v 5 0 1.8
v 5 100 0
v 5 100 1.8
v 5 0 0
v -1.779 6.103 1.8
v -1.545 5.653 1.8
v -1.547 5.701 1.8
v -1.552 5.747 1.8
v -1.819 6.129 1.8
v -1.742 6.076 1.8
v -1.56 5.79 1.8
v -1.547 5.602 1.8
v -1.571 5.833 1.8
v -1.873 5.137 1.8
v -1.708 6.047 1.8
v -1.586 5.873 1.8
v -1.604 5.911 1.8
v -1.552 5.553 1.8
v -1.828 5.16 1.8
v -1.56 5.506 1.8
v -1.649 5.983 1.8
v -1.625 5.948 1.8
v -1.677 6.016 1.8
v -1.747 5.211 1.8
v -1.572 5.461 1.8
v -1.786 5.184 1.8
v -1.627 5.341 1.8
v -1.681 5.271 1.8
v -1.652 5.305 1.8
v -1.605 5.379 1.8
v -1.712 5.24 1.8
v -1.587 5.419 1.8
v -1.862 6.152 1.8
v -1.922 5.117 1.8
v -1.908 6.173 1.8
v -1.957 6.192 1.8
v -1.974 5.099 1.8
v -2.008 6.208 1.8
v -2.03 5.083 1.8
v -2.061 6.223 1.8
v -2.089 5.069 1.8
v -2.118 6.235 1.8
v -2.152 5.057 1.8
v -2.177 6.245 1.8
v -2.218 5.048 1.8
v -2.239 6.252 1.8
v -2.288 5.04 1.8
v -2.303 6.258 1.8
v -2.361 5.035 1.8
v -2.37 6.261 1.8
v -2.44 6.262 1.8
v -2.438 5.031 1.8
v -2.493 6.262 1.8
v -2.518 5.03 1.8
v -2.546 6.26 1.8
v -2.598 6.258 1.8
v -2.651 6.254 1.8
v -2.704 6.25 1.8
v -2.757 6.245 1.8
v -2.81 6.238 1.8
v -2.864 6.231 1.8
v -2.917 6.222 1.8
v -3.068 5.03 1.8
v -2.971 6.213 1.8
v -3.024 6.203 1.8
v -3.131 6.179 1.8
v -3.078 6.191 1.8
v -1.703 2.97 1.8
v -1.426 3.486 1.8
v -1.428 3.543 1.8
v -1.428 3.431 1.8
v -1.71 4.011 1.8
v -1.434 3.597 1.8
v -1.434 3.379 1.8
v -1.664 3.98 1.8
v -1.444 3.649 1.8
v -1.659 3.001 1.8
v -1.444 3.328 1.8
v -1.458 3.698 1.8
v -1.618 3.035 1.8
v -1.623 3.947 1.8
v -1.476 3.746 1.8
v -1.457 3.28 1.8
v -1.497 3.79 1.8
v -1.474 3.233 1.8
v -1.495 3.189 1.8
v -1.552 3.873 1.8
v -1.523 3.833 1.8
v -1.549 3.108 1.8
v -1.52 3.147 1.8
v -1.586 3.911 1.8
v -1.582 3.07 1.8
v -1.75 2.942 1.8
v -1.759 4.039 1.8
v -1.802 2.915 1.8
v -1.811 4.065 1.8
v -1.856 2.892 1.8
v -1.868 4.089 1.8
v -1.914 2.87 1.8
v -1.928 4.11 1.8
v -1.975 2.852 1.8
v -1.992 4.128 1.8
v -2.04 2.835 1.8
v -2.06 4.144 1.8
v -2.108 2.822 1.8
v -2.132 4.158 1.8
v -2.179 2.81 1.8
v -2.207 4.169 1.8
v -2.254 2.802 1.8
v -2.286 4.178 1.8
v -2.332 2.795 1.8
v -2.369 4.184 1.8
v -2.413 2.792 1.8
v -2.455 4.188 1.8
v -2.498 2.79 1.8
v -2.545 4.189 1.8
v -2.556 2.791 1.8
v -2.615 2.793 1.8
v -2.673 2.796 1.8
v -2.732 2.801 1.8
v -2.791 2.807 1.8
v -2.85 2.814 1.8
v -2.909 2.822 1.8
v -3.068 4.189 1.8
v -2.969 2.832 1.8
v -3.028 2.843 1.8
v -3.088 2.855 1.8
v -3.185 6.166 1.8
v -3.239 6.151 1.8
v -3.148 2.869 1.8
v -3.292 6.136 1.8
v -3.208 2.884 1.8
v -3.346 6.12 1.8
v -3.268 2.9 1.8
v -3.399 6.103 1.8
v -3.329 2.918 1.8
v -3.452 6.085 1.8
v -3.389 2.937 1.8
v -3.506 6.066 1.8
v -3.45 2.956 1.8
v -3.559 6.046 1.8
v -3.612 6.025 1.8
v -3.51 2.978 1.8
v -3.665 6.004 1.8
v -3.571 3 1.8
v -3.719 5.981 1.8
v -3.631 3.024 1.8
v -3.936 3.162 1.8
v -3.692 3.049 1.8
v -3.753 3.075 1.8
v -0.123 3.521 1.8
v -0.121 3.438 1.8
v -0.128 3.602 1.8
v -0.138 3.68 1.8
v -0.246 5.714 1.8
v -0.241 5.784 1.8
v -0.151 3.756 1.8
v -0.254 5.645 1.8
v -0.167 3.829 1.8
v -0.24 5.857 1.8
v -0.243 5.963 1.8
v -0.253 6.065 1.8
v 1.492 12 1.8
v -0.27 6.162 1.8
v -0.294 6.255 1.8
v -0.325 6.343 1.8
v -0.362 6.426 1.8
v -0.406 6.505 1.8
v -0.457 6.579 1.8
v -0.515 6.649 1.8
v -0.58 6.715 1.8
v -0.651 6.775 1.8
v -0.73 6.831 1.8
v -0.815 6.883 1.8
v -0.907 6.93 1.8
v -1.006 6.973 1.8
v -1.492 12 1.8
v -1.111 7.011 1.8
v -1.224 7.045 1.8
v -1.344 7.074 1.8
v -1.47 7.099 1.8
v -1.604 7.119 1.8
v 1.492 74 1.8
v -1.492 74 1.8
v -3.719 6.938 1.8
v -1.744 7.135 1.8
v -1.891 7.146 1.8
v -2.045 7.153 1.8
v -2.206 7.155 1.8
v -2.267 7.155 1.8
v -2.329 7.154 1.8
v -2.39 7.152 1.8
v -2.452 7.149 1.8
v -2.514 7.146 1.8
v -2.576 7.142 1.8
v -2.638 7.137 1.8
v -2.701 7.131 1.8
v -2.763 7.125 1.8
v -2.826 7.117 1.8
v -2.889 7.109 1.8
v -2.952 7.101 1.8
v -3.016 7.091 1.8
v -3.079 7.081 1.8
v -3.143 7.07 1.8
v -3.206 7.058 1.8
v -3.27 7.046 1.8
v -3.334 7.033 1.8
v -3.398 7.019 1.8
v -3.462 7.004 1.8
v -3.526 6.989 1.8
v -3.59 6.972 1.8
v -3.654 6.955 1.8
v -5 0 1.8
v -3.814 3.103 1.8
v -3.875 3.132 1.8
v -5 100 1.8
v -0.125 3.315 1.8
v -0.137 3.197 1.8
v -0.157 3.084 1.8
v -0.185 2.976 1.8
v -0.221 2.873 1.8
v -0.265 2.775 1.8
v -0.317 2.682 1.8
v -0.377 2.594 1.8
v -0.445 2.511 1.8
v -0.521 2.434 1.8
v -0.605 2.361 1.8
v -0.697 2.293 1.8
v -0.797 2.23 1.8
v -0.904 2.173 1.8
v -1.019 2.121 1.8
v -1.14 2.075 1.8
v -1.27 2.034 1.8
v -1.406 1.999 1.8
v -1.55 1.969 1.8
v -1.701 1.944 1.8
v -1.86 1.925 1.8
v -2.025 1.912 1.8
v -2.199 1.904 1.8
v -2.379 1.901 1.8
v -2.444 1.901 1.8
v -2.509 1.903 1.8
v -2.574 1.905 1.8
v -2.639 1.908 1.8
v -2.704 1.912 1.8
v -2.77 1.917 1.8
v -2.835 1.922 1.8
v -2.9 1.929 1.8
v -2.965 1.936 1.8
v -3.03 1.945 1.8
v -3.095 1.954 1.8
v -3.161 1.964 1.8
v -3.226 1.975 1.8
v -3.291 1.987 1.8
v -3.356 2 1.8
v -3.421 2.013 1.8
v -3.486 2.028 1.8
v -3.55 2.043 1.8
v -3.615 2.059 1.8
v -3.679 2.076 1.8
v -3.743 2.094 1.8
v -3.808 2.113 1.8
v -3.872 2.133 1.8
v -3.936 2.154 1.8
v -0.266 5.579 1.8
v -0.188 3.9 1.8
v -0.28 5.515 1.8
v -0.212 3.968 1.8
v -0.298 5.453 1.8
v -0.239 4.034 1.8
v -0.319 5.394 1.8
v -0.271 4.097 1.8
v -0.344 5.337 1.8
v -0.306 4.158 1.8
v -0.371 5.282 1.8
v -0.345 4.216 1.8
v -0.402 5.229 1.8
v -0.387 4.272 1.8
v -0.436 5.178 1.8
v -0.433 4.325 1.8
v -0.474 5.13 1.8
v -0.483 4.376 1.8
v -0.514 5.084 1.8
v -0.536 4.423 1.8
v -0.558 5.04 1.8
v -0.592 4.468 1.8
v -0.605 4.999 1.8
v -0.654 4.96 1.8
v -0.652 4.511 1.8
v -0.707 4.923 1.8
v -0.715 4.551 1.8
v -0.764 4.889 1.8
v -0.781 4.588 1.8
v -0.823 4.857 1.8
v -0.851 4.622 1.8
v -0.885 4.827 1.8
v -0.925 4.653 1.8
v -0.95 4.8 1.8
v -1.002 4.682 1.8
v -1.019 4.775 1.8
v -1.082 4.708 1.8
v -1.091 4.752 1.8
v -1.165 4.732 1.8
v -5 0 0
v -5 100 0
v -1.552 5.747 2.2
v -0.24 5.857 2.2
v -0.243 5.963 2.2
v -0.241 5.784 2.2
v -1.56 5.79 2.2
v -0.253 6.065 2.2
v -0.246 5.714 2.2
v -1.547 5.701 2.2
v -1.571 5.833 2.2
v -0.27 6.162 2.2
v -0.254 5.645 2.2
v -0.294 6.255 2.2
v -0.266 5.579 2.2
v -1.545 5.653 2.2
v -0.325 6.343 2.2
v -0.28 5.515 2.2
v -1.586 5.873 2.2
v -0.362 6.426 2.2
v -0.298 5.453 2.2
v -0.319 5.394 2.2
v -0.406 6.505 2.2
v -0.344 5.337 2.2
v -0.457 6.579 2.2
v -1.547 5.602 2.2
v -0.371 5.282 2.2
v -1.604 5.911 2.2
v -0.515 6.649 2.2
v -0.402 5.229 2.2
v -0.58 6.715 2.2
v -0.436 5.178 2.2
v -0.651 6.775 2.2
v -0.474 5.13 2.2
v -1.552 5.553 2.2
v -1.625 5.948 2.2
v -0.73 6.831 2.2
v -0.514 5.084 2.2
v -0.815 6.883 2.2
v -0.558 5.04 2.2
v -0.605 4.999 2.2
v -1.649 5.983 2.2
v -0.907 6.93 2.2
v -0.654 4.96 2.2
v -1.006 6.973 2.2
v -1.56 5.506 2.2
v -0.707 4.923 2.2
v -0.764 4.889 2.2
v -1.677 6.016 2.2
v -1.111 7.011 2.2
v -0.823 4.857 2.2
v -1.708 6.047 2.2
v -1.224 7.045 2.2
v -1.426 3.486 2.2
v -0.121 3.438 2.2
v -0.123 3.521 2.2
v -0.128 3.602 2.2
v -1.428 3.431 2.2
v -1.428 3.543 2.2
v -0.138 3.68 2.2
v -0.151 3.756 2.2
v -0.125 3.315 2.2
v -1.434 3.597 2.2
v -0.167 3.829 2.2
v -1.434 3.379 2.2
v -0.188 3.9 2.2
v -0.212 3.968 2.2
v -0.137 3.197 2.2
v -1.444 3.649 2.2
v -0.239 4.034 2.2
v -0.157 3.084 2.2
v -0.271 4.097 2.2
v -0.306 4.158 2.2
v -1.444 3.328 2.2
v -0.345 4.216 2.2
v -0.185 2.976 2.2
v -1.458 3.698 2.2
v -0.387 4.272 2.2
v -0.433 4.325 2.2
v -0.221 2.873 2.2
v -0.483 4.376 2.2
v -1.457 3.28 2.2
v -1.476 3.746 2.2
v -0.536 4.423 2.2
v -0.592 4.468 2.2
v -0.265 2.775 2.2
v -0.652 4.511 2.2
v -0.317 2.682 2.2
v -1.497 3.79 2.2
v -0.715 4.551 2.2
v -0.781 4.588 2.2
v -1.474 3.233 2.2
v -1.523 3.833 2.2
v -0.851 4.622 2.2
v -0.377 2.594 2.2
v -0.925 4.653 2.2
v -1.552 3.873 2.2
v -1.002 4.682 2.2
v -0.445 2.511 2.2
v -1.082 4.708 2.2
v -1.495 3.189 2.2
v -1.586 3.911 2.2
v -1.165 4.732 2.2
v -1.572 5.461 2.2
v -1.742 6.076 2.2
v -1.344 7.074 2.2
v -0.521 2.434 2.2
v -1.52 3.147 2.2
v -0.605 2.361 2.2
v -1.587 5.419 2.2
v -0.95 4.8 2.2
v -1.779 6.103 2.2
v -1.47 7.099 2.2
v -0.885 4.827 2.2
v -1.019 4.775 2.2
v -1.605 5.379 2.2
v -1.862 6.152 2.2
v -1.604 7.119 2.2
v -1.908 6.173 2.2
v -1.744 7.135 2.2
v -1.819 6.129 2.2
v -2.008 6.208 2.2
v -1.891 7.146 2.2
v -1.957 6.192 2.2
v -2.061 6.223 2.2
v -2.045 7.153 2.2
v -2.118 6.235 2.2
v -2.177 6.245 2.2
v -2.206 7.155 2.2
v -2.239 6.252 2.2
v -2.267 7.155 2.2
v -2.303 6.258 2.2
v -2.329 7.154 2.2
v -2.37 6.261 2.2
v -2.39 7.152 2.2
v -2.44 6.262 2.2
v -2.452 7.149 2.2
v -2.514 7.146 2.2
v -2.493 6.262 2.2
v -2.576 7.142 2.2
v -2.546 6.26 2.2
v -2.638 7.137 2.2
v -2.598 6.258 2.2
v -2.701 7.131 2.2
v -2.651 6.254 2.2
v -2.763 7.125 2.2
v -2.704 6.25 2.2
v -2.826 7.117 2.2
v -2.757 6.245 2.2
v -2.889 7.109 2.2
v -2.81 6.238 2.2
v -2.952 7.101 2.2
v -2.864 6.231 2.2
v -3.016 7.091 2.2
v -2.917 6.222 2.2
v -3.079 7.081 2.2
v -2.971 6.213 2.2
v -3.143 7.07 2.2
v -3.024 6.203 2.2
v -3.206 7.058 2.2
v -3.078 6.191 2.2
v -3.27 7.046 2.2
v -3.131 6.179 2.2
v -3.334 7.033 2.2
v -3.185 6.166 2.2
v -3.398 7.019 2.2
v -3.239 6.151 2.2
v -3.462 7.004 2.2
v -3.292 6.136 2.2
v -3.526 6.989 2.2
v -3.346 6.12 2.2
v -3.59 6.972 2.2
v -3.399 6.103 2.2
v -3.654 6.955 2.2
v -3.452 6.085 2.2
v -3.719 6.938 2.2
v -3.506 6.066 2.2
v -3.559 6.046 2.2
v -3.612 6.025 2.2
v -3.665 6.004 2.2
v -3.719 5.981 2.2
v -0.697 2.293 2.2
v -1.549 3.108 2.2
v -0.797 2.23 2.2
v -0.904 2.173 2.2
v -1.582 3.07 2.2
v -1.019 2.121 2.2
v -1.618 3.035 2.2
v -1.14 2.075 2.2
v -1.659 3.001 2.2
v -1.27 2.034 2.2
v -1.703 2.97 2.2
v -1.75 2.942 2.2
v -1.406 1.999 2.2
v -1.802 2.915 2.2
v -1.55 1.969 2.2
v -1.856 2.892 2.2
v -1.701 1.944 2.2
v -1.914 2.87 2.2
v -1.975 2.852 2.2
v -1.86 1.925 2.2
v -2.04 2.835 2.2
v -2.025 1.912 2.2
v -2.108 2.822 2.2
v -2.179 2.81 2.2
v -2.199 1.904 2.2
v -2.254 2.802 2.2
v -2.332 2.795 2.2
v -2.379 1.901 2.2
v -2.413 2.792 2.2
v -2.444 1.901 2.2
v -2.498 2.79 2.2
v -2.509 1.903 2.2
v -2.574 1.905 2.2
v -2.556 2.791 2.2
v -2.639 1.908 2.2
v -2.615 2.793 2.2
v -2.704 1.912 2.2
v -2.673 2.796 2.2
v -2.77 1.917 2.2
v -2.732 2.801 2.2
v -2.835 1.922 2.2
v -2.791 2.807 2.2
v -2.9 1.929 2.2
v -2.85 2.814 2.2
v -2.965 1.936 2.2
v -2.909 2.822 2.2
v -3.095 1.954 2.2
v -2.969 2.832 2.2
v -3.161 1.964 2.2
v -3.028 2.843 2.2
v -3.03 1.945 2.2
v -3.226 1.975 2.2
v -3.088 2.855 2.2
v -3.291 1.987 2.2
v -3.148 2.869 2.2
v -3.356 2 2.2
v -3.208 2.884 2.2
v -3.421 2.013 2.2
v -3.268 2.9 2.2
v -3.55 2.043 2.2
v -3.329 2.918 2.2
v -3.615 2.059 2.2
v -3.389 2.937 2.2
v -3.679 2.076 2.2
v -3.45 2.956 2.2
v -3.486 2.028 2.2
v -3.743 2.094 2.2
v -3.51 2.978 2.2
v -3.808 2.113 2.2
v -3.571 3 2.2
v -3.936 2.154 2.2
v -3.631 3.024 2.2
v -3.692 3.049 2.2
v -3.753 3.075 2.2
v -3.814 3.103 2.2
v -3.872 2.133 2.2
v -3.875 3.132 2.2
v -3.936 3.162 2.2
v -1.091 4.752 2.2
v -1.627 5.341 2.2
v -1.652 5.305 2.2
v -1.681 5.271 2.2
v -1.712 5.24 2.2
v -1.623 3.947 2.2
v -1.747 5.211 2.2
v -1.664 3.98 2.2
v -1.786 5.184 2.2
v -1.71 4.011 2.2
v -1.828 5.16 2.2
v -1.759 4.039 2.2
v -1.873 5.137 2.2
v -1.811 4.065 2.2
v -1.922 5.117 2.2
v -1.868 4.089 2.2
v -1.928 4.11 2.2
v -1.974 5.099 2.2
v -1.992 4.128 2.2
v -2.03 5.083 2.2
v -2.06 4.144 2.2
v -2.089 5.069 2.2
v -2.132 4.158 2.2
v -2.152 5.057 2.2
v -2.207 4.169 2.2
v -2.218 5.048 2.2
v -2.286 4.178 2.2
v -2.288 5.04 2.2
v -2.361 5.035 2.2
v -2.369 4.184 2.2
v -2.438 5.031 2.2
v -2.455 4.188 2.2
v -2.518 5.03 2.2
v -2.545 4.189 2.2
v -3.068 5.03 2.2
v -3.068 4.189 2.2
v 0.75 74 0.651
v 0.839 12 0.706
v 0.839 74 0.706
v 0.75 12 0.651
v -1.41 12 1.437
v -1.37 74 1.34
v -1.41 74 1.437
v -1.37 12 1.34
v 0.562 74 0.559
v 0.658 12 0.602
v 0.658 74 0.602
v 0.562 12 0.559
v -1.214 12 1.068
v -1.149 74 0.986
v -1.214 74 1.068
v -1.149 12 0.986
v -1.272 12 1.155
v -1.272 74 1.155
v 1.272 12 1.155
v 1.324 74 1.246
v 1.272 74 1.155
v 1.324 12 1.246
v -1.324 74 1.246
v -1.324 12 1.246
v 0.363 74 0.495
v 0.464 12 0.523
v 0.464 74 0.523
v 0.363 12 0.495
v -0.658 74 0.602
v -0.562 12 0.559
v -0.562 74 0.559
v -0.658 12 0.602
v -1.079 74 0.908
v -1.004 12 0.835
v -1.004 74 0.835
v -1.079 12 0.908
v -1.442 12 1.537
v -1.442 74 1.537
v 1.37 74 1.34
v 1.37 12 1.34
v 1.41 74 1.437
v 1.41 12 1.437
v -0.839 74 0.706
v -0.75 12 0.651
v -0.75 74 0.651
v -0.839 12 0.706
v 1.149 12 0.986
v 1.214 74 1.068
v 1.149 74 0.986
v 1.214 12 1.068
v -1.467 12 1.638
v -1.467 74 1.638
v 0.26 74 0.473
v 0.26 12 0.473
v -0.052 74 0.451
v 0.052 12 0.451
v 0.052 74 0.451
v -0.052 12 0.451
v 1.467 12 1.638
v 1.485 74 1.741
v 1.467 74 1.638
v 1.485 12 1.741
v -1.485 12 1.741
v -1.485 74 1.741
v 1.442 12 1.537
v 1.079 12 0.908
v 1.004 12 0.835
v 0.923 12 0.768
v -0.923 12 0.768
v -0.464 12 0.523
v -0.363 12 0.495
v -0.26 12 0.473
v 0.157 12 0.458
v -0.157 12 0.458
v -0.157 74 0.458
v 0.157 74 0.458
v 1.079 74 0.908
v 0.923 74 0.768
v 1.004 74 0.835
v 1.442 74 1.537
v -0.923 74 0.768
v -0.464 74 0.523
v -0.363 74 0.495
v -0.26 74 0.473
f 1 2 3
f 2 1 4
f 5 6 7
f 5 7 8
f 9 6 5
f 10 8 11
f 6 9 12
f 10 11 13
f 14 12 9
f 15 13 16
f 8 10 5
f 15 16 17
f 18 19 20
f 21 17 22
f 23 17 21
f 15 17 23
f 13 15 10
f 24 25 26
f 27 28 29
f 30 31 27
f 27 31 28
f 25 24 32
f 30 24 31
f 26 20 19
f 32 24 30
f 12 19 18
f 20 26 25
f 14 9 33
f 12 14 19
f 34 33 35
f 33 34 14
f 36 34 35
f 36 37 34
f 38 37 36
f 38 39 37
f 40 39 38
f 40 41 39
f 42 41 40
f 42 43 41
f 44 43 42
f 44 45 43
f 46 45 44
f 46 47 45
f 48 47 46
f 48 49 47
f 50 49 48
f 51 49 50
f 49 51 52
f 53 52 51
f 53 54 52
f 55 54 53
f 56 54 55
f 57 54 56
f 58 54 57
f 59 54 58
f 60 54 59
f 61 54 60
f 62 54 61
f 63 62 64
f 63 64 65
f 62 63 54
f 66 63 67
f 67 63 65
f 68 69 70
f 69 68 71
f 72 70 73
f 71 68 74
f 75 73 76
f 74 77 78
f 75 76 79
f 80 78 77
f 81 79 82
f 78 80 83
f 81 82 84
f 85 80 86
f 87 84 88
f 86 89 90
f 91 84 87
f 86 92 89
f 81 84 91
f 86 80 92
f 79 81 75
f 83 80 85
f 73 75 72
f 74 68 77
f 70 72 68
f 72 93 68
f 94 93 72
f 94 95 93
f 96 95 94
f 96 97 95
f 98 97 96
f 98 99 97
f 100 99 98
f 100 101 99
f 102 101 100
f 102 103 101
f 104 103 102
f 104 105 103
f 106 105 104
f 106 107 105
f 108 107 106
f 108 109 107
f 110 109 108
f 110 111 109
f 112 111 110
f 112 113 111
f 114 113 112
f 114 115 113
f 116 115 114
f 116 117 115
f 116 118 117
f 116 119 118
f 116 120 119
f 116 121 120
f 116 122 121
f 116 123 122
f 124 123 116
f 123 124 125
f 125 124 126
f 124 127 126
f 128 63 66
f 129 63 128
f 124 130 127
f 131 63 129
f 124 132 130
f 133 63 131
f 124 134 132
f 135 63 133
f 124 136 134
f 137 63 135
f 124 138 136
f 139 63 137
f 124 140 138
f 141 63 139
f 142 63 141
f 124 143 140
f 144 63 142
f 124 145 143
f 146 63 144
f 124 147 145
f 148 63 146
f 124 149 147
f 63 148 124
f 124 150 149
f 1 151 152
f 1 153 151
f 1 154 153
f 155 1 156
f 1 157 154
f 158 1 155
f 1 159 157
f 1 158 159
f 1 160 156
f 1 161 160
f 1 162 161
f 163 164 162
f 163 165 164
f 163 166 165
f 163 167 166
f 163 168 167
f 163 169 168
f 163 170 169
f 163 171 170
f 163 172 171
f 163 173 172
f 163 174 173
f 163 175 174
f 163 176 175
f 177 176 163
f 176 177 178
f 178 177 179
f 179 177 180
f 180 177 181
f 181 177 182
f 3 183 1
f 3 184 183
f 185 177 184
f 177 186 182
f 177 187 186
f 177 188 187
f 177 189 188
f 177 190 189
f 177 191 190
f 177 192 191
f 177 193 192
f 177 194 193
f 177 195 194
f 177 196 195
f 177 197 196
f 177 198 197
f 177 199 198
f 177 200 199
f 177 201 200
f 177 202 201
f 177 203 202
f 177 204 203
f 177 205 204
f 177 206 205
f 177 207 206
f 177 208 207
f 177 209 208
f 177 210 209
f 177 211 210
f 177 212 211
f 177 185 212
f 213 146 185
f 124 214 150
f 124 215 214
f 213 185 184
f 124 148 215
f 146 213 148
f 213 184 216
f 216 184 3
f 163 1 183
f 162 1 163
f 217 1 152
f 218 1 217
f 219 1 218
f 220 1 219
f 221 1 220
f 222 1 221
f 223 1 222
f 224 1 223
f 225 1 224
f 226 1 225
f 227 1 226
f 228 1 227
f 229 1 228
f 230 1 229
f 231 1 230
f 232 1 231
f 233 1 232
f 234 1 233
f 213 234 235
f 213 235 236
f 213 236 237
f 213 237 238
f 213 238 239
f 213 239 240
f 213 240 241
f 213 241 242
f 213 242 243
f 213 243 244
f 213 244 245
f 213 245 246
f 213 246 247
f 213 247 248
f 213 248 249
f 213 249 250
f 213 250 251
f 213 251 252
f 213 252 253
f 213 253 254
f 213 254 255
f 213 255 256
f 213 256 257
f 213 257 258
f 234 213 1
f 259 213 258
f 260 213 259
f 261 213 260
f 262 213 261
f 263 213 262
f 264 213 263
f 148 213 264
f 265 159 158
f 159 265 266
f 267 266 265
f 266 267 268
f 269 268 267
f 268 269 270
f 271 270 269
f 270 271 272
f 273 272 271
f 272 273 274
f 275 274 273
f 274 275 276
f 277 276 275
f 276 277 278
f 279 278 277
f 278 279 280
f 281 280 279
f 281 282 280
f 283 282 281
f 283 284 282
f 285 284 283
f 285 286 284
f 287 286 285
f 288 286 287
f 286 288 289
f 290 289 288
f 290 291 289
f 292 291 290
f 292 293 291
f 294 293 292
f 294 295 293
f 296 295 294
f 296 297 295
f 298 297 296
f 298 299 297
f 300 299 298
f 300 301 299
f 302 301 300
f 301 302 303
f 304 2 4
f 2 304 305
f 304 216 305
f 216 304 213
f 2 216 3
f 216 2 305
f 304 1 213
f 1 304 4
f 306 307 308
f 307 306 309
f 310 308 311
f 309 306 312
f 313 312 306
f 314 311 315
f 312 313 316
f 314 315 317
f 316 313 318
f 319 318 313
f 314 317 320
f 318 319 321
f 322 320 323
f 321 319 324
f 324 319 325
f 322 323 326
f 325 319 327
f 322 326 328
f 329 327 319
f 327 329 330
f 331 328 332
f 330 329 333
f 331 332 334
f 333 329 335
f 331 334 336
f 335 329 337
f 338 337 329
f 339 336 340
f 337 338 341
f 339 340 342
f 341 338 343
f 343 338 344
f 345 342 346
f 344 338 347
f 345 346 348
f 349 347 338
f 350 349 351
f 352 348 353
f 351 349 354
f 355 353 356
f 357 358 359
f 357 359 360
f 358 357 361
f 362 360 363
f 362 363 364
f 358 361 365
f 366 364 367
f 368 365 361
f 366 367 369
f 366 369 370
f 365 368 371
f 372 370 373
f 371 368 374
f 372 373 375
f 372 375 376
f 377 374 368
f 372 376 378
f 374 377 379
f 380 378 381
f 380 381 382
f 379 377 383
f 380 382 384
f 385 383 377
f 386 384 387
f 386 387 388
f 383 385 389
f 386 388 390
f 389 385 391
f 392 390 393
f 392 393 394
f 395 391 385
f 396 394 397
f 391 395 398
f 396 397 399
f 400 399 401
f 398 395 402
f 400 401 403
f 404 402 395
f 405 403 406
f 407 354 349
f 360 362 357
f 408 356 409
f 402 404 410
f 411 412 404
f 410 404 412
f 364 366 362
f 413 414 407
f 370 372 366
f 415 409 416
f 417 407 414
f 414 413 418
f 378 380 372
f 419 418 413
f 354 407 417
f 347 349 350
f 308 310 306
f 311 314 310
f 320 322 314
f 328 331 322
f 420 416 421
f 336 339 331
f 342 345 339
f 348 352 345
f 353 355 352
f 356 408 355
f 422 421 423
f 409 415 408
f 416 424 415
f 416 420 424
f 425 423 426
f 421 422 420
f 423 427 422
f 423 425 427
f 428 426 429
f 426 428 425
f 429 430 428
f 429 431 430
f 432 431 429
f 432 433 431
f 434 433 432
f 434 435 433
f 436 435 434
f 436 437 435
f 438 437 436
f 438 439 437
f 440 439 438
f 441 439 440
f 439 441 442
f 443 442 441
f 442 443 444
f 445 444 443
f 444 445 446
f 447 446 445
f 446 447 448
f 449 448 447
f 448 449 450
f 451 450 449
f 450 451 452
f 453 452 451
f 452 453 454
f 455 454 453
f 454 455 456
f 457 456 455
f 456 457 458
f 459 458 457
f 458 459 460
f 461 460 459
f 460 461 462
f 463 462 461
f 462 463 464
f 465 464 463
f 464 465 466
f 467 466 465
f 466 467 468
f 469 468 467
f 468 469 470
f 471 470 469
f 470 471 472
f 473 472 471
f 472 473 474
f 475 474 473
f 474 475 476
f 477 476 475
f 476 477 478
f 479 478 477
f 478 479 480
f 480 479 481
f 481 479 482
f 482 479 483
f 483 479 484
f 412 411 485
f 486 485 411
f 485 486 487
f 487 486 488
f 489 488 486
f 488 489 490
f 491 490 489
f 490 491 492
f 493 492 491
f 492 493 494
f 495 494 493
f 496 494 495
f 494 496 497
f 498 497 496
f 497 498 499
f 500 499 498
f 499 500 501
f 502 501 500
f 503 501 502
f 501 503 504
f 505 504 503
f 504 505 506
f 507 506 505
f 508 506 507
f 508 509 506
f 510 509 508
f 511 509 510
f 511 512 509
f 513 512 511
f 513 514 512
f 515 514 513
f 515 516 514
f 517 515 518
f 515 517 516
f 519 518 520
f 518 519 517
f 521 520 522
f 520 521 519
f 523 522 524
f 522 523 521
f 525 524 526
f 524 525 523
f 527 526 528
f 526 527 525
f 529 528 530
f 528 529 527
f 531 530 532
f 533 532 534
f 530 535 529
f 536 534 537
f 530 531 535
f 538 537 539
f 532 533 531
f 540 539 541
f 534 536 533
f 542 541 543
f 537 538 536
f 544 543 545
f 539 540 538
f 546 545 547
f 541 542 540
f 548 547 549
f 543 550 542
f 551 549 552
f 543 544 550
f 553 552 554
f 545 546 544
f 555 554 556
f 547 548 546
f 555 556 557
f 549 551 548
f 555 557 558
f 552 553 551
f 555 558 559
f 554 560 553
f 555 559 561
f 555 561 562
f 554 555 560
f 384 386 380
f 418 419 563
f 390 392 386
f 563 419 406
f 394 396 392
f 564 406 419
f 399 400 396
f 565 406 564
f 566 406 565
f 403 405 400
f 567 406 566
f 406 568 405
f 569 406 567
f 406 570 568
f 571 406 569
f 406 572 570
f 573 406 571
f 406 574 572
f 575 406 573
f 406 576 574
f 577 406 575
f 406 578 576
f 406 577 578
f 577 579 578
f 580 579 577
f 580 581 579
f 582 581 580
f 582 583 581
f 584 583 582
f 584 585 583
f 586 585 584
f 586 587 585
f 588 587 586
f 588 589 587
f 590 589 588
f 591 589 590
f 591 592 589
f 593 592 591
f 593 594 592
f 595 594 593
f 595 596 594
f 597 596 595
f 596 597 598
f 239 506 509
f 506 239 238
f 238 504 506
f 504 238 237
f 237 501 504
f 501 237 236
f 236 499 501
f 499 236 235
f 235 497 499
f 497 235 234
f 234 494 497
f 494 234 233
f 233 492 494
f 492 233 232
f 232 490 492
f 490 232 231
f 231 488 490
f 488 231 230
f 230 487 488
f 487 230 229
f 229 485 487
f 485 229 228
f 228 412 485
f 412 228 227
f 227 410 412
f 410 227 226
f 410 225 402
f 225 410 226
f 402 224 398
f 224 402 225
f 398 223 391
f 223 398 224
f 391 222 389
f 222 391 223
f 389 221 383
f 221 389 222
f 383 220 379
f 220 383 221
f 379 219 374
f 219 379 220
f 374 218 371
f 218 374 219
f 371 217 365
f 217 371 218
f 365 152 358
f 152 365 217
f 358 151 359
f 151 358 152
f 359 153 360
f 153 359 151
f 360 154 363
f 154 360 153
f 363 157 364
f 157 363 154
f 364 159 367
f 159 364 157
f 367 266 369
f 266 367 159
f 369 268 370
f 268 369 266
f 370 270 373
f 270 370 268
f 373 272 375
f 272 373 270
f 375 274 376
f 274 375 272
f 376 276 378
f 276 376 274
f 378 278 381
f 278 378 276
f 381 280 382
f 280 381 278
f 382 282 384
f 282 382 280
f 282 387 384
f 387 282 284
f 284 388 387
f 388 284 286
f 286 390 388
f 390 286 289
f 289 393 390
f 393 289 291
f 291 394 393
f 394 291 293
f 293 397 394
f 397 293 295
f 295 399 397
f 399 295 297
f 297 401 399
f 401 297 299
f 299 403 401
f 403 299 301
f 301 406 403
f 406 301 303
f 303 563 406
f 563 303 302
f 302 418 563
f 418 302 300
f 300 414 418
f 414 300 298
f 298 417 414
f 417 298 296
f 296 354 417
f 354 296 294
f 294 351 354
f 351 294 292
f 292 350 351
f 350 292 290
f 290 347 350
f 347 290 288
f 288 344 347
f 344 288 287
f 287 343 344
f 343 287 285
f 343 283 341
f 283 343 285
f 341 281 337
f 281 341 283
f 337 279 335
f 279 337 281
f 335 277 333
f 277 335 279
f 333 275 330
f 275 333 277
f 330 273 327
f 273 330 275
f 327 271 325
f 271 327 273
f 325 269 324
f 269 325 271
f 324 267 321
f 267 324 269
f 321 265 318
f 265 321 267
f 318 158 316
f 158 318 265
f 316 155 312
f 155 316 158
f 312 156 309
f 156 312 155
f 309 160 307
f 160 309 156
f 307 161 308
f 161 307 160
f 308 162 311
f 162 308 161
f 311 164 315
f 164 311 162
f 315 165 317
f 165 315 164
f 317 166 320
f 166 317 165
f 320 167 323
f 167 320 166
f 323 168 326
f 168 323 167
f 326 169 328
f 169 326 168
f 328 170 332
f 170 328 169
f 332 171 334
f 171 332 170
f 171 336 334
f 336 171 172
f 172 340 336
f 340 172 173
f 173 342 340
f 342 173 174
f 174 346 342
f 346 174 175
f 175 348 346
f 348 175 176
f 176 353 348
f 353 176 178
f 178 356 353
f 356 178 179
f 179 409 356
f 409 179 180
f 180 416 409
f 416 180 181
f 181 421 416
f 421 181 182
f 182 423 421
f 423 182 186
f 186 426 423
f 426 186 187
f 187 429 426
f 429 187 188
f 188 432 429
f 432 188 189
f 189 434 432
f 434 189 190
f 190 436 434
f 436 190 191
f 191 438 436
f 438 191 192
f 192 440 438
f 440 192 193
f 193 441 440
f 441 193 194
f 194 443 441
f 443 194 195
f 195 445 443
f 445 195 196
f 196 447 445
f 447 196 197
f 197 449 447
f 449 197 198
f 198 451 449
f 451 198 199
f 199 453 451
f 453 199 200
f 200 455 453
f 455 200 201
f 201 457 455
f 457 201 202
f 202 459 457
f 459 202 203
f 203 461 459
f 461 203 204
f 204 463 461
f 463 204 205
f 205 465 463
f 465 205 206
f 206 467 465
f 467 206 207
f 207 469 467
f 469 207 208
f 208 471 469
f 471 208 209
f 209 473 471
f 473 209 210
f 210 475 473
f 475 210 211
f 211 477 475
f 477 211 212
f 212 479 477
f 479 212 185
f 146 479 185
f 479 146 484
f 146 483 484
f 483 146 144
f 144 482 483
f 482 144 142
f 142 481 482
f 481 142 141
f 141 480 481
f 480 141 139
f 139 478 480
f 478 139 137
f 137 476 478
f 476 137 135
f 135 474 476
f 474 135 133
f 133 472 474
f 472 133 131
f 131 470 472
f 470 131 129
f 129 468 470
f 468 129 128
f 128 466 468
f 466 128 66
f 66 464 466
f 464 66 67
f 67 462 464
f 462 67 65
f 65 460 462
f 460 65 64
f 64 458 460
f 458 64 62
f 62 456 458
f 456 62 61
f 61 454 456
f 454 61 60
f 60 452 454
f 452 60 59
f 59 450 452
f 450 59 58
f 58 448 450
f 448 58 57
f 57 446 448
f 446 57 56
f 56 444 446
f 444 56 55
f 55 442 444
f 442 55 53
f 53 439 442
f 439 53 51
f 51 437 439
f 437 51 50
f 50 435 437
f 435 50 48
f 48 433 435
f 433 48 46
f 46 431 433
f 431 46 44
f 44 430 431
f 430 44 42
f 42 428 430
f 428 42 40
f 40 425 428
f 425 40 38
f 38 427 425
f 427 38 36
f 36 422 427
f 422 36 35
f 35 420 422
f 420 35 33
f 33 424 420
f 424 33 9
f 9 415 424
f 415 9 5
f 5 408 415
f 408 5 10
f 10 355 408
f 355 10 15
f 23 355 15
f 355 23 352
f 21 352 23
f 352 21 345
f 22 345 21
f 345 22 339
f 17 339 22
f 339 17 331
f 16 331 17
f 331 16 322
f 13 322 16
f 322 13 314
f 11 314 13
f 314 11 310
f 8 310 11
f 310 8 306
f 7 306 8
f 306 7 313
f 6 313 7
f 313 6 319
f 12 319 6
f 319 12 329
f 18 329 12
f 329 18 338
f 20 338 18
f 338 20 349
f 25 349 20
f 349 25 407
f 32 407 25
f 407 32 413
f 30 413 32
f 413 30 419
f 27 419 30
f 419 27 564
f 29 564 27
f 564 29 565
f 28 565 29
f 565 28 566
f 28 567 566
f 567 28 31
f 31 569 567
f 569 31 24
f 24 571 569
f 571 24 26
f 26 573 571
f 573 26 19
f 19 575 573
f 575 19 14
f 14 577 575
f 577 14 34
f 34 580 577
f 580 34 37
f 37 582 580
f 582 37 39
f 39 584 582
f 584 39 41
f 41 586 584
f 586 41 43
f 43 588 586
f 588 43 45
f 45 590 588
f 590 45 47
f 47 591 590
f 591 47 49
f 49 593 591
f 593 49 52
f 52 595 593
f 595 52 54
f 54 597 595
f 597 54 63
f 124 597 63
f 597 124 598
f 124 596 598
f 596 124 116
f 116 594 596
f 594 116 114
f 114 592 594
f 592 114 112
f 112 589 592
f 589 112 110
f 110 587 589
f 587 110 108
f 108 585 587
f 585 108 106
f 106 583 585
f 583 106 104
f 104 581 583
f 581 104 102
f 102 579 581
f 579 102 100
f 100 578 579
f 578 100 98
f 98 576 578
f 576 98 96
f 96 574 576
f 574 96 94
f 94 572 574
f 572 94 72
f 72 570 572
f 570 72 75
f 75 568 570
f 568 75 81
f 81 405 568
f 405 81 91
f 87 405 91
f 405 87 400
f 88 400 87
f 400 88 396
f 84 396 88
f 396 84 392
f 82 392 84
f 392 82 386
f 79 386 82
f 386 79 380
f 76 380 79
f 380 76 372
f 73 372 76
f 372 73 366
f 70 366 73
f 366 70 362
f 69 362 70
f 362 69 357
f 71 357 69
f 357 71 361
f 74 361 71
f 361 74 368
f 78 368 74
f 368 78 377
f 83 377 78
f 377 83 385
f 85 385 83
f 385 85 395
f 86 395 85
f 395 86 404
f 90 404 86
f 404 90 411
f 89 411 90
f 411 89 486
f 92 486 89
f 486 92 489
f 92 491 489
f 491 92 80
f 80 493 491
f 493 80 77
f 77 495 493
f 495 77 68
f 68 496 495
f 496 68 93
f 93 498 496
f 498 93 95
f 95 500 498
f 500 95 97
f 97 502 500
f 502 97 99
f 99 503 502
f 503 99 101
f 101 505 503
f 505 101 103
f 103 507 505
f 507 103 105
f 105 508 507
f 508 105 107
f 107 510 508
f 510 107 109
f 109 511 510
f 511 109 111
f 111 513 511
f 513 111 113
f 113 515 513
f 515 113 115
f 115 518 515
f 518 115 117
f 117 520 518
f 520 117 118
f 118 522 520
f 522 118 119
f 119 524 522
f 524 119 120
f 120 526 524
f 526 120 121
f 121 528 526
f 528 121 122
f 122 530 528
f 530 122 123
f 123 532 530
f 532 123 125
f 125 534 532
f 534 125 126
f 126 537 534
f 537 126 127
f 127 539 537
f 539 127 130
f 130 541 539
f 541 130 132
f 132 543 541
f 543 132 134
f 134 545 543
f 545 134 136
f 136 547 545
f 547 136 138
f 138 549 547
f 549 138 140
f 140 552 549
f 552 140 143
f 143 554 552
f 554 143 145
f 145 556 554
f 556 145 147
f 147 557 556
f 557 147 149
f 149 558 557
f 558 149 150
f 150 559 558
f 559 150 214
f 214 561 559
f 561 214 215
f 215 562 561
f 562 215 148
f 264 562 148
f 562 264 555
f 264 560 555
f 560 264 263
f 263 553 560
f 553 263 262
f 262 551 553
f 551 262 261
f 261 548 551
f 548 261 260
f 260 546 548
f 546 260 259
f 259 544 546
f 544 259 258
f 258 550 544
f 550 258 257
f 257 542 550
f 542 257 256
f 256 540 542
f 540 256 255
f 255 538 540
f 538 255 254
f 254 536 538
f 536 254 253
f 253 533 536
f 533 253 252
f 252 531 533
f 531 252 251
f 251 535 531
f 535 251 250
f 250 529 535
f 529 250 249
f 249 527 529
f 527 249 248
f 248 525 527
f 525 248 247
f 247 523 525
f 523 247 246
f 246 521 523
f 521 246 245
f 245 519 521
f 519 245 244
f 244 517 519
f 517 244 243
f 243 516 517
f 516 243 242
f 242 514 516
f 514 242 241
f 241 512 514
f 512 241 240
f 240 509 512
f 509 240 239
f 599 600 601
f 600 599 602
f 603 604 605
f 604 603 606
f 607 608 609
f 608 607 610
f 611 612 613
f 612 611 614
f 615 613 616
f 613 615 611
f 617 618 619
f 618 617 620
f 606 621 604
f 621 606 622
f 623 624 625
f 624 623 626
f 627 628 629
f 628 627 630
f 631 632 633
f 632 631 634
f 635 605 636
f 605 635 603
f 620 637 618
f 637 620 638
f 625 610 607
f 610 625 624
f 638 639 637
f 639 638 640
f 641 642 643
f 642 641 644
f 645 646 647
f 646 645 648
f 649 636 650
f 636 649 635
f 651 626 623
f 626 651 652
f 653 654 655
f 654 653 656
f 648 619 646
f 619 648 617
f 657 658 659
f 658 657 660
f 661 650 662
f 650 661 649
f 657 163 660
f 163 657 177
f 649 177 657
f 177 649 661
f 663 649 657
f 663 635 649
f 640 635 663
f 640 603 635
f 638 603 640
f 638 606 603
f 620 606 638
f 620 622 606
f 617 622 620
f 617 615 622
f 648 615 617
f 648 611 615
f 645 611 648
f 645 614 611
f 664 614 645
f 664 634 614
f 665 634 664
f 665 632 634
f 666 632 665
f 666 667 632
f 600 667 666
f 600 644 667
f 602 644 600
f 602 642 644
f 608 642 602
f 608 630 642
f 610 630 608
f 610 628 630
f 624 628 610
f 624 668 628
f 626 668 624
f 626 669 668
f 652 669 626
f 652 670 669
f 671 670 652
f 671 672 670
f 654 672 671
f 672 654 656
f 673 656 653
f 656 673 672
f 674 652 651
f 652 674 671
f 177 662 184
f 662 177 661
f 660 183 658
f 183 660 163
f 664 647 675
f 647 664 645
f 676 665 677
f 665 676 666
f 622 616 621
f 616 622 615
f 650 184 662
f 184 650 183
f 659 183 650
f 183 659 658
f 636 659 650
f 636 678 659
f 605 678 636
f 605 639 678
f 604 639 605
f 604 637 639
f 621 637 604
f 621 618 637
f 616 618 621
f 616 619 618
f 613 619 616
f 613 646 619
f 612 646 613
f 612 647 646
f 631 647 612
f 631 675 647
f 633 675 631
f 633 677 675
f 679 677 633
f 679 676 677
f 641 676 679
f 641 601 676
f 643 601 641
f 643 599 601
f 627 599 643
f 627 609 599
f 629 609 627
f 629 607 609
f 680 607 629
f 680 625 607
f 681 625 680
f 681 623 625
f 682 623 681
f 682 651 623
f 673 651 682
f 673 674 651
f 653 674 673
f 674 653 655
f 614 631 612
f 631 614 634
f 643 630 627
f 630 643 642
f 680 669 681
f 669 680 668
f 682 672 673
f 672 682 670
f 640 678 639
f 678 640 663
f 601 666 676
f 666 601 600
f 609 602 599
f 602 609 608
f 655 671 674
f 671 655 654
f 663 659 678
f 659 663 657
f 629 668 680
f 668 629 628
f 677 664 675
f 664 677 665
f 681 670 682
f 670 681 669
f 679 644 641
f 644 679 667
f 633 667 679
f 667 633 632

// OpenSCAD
// file: module/drill-bit-storage.scad
/*
    Drill bit storage
*/

$fn=90;  // accuracy


// Constants (Don't change)
storageLenght = 100; // Not Bit lenght
maxBitLenght  = 70;  // Check bit lenght
storageWidth  = 10;  // Minimum width

// Bit dependent
bitDiameter = 4.0;



module drillBitStorage (bitDiameter,maxBitLenght,
	storageWidth,storageLenght){

// Automatic Variables  (Don't change)
diameterText      = str(bitDiameter);
storageHight      = bitDiameter*0.6; 
bitRadius         = bitDiameter/2;
bitPositionHeight = storageHight+bitDiameter*0.05; 


// Delition for crating drill track
difference() {

// Union for text and storage
union(){

// Storage 
translate([
    -storageWidth/2,    // Centering
    0, 
    0
    ]) 
cube(size = [
    storageWidth,
    storageLenght,
    storageHight
    ]);

// Milimiter dimension text
translate([
    -4.4,               // Fine deling x-axis
    2,                  // Fine deling y-axis 
    storageHight         
    ])
linear_extrude(height=0.4)text(
    diameterText,  // Dynamic text
    size=5,
    font="tohoma:style=bold",
    spacing=0.9
    );
    
// End of union    
}  

// Begining of Delition
// Drill tracl
rotate([90,0,0])
translate([
    0,                   // x-axis
    bitPositionHeight,   // Z-axis
    -(maxBitLenght+12)    // y-axis
    ])  
cylinder(
    h = maxBitLenght,    // y-axis
    r = bitRadius        // x-axis 
    );      

// End of Delition
}}
// main file
/*
    Drill bit storage
*/

$fn=90;  // accuracy

// import module
use <module/drill-bit-storage.scad>;



// Tootale lenght of the unit
storageLenght = 100; 

// Width of the unit
storageWidth  = 10;  // (Constant under 4mm)  

// The lenght of the drill bit
maxBitLenght  = 62;  

// Drill bit diameter  
bitDiameter = 3.0;


// Call the module
drillBitStorage 
    (bitDiameter,maxBitLenght,storageWidth,storageLenght);
